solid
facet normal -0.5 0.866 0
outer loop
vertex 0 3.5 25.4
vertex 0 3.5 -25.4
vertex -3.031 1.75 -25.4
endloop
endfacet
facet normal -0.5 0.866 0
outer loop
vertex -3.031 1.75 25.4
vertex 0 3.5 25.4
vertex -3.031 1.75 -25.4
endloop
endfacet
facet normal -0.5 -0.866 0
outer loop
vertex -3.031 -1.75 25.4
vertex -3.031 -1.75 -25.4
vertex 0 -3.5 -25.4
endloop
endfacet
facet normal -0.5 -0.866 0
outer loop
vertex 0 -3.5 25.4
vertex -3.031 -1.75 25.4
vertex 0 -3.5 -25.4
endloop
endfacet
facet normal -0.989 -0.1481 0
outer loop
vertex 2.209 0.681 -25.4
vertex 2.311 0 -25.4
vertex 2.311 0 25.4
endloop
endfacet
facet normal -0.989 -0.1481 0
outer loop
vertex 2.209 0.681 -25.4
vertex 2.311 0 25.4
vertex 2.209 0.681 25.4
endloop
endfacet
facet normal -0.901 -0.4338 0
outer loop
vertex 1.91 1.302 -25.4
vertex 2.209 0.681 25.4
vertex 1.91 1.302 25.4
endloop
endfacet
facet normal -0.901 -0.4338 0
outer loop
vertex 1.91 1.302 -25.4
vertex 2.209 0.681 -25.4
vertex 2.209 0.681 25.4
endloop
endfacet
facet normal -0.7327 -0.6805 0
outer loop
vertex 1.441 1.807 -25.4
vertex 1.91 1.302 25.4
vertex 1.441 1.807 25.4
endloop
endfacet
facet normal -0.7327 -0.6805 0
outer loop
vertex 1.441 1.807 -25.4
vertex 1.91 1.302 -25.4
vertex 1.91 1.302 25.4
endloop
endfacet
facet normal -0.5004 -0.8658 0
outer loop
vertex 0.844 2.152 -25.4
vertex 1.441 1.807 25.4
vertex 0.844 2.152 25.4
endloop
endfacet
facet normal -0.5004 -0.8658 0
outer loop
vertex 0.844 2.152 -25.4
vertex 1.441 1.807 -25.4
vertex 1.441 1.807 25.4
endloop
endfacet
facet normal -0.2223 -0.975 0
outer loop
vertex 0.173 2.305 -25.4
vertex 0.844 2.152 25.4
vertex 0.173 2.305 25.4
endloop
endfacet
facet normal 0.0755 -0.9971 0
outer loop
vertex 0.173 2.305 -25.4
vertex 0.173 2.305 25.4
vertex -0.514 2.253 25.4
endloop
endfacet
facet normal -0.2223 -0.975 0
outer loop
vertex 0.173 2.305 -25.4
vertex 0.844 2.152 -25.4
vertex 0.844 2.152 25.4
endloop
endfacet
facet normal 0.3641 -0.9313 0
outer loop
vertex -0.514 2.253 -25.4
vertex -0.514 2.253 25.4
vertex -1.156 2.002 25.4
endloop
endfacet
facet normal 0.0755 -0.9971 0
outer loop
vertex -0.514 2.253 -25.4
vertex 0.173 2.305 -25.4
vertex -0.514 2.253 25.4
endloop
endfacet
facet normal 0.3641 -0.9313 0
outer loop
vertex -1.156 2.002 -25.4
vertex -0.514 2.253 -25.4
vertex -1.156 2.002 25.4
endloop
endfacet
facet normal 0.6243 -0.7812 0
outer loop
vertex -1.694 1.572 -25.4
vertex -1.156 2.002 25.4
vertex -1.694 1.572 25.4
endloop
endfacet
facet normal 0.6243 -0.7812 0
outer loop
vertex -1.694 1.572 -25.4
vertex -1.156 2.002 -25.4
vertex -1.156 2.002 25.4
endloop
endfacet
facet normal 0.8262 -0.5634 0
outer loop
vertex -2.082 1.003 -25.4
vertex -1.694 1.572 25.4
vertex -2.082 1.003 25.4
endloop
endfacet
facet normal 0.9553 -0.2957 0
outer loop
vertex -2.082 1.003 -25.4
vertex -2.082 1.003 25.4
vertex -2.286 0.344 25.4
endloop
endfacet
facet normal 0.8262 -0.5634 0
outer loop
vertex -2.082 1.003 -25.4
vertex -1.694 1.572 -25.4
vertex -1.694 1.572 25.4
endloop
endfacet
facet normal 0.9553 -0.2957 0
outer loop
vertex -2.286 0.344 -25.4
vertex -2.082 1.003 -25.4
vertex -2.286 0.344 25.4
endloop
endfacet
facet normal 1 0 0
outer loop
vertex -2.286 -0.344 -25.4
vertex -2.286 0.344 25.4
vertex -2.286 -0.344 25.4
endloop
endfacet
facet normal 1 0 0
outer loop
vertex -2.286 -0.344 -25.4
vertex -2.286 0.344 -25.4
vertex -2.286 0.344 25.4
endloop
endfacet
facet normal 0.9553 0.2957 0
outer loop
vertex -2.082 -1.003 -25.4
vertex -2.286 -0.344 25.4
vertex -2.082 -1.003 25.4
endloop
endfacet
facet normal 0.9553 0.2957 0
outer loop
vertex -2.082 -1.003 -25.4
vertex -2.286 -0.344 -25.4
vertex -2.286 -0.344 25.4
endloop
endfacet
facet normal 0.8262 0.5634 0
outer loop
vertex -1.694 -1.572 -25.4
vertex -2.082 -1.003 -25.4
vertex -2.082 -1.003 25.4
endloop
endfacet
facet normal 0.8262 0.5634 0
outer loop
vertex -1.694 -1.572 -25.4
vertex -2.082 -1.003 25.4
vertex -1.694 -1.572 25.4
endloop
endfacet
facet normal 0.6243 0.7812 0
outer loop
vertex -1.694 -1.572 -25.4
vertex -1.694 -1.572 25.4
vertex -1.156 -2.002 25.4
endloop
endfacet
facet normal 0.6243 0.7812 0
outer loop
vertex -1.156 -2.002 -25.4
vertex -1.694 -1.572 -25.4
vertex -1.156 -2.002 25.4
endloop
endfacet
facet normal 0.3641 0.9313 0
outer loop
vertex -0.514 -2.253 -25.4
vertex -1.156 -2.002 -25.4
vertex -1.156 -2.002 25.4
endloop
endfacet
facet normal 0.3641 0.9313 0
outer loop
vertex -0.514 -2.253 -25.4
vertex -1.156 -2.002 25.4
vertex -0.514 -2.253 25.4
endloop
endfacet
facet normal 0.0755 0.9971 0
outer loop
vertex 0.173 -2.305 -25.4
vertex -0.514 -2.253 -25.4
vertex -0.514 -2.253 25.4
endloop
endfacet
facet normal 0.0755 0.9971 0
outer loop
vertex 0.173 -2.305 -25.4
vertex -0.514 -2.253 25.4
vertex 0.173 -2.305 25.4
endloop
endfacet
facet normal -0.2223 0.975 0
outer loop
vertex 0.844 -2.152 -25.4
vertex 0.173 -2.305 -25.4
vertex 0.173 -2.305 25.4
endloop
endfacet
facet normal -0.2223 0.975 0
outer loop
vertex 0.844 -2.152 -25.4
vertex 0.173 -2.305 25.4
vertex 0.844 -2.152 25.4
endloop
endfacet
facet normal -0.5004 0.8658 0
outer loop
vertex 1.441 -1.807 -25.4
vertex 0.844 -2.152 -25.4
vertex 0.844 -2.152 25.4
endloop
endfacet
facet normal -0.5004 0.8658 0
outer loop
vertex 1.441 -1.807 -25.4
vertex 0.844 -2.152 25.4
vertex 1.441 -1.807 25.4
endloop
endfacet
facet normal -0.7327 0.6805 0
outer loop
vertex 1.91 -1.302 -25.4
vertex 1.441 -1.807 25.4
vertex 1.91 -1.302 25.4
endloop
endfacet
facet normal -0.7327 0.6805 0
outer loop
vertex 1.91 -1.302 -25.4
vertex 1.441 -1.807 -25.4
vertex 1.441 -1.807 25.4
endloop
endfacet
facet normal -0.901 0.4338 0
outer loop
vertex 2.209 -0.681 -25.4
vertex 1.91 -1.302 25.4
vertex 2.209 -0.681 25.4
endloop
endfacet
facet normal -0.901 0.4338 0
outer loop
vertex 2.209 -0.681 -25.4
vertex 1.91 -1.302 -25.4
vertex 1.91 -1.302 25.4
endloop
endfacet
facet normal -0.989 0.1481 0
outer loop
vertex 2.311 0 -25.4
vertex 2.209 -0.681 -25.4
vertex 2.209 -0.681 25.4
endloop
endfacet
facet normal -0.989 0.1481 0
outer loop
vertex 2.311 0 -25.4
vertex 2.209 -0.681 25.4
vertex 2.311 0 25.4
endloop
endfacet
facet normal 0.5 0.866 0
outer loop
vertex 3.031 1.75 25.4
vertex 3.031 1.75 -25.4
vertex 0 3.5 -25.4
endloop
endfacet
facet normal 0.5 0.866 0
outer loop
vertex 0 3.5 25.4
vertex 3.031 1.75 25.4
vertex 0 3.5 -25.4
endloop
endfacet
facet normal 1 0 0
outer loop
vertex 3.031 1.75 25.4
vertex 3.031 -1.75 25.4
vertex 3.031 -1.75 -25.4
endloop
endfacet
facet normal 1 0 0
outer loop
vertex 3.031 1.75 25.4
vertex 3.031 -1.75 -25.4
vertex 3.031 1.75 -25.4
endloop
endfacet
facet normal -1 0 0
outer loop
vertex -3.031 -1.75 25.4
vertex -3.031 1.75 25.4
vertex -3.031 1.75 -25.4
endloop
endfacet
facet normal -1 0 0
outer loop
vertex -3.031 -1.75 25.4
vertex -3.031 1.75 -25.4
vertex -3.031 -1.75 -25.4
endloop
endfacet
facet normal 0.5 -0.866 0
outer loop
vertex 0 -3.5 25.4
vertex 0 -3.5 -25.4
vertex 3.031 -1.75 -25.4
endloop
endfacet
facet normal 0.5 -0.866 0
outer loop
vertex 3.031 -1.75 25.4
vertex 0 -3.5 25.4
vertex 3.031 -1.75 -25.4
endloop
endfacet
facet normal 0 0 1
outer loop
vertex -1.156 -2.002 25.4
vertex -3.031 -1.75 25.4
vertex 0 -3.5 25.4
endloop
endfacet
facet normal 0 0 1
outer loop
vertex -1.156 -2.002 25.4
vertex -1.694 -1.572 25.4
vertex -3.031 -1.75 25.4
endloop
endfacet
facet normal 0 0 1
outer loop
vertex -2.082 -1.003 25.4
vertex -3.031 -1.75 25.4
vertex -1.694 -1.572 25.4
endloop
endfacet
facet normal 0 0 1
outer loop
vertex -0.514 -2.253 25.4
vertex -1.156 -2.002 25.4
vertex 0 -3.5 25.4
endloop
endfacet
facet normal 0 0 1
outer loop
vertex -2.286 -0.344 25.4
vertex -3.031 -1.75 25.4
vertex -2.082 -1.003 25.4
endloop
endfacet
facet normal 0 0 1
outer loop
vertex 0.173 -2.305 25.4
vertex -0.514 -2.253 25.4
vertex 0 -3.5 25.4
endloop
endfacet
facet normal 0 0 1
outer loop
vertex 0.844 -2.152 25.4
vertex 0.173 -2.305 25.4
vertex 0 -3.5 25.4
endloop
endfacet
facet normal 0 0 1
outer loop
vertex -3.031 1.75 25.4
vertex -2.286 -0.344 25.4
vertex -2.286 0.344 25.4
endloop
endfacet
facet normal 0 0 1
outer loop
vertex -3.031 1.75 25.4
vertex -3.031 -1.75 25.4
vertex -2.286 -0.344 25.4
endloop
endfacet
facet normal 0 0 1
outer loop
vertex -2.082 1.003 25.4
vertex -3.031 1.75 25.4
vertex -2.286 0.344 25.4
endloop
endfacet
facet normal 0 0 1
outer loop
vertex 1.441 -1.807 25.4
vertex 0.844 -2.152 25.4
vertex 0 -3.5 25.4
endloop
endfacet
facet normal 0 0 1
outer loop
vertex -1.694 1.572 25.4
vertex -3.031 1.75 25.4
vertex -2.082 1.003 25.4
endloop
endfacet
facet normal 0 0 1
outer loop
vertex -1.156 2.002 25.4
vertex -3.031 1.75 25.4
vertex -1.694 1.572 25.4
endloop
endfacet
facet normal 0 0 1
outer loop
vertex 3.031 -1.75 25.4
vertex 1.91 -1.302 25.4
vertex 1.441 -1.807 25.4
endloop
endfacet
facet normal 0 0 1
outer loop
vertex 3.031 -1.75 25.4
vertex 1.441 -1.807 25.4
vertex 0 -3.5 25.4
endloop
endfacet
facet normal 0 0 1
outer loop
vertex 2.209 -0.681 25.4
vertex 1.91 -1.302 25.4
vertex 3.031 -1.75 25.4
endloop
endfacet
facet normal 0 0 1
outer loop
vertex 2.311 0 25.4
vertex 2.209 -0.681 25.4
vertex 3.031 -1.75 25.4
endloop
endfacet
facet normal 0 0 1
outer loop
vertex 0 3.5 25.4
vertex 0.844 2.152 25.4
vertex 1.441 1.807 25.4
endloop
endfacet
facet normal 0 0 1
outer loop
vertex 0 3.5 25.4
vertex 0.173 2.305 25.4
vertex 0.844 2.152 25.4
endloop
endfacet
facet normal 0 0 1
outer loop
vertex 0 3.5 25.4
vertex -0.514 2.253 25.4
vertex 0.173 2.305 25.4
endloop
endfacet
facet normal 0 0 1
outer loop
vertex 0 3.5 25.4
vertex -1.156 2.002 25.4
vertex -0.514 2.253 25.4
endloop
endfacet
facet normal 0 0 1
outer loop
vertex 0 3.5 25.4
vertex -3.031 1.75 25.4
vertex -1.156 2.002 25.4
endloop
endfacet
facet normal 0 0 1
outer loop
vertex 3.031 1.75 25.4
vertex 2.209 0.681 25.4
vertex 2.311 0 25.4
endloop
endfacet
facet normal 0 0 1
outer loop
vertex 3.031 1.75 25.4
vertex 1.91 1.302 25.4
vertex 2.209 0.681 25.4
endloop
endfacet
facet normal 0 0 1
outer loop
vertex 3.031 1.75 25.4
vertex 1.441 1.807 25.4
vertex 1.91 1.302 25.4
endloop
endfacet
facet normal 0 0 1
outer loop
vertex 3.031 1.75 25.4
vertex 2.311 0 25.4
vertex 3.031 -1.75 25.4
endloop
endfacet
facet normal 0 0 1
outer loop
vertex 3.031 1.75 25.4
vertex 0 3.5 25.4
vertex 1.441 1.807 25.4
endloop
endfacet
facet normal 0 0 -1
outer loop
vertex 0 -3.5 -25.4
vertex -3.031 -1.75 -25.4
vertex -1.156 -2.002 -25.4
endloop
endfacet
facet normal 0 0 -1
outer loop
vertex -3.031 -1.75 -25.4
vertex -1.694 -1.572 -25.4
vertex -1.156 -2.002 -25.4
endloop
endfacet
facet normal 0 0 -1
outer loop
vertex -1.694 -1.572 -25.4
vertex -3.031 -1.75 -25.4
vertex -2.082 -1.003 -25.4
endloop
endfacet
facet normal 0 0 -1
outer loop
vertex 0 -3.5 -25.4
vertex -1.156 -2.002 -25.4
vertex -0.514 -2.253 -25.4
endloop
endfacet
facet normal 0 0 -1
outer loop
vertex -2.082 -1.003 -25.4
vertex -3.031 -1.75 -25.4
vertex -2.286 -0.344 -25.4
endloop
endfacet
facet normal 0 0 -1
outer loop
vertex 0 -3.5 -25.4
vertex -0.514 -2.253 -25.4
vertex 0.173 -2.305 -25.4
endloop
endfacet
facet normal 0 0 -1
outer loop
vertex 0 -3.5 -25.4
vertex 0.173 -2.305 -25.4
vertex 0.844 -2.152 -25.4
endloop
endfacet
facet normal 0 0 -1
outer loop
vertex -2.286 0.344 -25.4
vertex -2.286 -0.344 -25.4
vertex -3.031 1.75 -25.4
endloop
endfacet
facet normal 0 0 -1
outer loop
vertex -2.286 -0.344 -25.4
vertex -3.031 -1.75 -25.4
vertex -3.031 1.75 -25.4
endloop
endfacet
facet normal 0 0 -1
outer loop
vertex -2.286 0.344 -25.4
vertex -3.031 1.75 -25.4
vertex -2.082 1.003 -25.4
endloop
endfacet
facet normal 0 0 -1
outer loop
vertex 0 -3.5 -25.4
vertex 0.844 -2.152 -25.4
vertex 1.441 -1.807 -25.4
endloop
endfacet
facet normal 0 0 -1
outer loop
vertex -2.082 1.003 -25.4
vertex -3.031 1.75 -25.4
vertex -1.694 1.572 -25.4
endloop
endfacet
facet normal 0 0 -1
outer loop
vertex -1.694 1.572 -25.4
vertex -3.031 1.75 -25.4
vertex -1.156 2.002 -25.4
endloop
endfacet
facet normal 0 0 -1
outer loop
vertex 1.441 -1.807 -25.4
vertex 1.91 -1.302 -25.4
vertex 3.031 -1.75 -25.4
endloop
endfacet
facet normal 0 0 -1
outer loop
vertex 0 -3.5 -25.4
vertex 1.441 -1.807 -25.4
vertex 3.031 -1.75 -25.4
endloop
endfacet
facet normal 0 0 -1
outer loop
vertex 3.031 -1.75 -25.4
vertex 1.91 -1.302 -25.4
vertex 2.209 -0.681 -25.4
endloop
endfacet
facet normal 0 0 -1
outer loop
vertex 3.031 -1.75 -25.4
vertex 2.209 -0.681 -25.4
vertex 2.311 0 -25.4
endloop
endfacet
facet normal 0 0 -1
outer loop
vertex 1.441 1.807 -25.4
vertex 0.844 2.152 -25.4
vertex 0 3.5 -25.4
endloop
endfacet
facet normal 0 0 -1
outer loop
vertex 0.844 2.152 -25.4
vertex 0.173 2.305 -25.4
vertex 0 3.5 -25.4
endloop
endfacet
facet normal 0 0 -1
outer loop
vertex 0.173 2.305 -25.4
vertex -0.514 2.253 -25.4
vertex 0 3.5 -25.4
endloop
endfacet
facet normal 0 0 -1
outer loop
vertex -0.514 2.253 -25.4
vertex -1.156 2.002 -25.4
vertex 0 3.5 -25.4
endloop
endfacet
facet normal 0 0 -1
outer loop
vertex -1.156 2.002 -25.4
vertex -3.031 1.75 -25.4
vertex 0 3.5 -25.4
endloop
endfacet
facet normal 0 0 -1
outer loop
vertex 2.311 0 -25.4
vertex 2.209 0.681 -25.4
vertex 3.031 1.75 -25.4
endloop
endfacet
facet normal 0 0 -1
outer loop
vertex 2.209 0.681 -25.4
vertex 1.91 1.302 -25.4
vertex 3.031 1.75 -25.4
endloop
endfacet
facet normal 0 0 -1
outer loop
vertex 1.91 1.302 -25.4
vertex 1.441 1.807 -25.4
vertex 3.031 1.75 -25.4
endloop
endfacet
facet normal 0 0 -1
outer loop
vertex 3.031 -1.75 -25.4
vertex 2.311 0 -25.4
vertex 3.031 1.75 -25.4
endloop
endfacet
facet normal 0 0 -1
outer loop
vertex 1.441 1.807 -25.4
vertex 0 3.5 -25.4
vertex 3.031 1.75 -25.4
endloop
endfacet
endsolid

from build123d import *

# Parameters (mm, degrees)
F0_R     = 2.3114
F1_DEPTH = 50.8


with BuildPart() as f1:
    # F0 (on Top) → F1 (new body)
    with BuildSketch(Plane.XY):
        Polygon((3.031089, 1.75), (0, 3.5), (-3.031089, 1.75), (-3.031089, -1.75), (0, -3.5), (3.031089, -1.75), align=None)
        Circle(F0_R, mode=Mode.SUBTRACT)
    extrude(amount=F1_DEPTH)


with BuildPart() as f1_1:
    # F2: moved
    add(f1.part.moved(Location((0, 0, -25.4))))


solid = f1_1.part
